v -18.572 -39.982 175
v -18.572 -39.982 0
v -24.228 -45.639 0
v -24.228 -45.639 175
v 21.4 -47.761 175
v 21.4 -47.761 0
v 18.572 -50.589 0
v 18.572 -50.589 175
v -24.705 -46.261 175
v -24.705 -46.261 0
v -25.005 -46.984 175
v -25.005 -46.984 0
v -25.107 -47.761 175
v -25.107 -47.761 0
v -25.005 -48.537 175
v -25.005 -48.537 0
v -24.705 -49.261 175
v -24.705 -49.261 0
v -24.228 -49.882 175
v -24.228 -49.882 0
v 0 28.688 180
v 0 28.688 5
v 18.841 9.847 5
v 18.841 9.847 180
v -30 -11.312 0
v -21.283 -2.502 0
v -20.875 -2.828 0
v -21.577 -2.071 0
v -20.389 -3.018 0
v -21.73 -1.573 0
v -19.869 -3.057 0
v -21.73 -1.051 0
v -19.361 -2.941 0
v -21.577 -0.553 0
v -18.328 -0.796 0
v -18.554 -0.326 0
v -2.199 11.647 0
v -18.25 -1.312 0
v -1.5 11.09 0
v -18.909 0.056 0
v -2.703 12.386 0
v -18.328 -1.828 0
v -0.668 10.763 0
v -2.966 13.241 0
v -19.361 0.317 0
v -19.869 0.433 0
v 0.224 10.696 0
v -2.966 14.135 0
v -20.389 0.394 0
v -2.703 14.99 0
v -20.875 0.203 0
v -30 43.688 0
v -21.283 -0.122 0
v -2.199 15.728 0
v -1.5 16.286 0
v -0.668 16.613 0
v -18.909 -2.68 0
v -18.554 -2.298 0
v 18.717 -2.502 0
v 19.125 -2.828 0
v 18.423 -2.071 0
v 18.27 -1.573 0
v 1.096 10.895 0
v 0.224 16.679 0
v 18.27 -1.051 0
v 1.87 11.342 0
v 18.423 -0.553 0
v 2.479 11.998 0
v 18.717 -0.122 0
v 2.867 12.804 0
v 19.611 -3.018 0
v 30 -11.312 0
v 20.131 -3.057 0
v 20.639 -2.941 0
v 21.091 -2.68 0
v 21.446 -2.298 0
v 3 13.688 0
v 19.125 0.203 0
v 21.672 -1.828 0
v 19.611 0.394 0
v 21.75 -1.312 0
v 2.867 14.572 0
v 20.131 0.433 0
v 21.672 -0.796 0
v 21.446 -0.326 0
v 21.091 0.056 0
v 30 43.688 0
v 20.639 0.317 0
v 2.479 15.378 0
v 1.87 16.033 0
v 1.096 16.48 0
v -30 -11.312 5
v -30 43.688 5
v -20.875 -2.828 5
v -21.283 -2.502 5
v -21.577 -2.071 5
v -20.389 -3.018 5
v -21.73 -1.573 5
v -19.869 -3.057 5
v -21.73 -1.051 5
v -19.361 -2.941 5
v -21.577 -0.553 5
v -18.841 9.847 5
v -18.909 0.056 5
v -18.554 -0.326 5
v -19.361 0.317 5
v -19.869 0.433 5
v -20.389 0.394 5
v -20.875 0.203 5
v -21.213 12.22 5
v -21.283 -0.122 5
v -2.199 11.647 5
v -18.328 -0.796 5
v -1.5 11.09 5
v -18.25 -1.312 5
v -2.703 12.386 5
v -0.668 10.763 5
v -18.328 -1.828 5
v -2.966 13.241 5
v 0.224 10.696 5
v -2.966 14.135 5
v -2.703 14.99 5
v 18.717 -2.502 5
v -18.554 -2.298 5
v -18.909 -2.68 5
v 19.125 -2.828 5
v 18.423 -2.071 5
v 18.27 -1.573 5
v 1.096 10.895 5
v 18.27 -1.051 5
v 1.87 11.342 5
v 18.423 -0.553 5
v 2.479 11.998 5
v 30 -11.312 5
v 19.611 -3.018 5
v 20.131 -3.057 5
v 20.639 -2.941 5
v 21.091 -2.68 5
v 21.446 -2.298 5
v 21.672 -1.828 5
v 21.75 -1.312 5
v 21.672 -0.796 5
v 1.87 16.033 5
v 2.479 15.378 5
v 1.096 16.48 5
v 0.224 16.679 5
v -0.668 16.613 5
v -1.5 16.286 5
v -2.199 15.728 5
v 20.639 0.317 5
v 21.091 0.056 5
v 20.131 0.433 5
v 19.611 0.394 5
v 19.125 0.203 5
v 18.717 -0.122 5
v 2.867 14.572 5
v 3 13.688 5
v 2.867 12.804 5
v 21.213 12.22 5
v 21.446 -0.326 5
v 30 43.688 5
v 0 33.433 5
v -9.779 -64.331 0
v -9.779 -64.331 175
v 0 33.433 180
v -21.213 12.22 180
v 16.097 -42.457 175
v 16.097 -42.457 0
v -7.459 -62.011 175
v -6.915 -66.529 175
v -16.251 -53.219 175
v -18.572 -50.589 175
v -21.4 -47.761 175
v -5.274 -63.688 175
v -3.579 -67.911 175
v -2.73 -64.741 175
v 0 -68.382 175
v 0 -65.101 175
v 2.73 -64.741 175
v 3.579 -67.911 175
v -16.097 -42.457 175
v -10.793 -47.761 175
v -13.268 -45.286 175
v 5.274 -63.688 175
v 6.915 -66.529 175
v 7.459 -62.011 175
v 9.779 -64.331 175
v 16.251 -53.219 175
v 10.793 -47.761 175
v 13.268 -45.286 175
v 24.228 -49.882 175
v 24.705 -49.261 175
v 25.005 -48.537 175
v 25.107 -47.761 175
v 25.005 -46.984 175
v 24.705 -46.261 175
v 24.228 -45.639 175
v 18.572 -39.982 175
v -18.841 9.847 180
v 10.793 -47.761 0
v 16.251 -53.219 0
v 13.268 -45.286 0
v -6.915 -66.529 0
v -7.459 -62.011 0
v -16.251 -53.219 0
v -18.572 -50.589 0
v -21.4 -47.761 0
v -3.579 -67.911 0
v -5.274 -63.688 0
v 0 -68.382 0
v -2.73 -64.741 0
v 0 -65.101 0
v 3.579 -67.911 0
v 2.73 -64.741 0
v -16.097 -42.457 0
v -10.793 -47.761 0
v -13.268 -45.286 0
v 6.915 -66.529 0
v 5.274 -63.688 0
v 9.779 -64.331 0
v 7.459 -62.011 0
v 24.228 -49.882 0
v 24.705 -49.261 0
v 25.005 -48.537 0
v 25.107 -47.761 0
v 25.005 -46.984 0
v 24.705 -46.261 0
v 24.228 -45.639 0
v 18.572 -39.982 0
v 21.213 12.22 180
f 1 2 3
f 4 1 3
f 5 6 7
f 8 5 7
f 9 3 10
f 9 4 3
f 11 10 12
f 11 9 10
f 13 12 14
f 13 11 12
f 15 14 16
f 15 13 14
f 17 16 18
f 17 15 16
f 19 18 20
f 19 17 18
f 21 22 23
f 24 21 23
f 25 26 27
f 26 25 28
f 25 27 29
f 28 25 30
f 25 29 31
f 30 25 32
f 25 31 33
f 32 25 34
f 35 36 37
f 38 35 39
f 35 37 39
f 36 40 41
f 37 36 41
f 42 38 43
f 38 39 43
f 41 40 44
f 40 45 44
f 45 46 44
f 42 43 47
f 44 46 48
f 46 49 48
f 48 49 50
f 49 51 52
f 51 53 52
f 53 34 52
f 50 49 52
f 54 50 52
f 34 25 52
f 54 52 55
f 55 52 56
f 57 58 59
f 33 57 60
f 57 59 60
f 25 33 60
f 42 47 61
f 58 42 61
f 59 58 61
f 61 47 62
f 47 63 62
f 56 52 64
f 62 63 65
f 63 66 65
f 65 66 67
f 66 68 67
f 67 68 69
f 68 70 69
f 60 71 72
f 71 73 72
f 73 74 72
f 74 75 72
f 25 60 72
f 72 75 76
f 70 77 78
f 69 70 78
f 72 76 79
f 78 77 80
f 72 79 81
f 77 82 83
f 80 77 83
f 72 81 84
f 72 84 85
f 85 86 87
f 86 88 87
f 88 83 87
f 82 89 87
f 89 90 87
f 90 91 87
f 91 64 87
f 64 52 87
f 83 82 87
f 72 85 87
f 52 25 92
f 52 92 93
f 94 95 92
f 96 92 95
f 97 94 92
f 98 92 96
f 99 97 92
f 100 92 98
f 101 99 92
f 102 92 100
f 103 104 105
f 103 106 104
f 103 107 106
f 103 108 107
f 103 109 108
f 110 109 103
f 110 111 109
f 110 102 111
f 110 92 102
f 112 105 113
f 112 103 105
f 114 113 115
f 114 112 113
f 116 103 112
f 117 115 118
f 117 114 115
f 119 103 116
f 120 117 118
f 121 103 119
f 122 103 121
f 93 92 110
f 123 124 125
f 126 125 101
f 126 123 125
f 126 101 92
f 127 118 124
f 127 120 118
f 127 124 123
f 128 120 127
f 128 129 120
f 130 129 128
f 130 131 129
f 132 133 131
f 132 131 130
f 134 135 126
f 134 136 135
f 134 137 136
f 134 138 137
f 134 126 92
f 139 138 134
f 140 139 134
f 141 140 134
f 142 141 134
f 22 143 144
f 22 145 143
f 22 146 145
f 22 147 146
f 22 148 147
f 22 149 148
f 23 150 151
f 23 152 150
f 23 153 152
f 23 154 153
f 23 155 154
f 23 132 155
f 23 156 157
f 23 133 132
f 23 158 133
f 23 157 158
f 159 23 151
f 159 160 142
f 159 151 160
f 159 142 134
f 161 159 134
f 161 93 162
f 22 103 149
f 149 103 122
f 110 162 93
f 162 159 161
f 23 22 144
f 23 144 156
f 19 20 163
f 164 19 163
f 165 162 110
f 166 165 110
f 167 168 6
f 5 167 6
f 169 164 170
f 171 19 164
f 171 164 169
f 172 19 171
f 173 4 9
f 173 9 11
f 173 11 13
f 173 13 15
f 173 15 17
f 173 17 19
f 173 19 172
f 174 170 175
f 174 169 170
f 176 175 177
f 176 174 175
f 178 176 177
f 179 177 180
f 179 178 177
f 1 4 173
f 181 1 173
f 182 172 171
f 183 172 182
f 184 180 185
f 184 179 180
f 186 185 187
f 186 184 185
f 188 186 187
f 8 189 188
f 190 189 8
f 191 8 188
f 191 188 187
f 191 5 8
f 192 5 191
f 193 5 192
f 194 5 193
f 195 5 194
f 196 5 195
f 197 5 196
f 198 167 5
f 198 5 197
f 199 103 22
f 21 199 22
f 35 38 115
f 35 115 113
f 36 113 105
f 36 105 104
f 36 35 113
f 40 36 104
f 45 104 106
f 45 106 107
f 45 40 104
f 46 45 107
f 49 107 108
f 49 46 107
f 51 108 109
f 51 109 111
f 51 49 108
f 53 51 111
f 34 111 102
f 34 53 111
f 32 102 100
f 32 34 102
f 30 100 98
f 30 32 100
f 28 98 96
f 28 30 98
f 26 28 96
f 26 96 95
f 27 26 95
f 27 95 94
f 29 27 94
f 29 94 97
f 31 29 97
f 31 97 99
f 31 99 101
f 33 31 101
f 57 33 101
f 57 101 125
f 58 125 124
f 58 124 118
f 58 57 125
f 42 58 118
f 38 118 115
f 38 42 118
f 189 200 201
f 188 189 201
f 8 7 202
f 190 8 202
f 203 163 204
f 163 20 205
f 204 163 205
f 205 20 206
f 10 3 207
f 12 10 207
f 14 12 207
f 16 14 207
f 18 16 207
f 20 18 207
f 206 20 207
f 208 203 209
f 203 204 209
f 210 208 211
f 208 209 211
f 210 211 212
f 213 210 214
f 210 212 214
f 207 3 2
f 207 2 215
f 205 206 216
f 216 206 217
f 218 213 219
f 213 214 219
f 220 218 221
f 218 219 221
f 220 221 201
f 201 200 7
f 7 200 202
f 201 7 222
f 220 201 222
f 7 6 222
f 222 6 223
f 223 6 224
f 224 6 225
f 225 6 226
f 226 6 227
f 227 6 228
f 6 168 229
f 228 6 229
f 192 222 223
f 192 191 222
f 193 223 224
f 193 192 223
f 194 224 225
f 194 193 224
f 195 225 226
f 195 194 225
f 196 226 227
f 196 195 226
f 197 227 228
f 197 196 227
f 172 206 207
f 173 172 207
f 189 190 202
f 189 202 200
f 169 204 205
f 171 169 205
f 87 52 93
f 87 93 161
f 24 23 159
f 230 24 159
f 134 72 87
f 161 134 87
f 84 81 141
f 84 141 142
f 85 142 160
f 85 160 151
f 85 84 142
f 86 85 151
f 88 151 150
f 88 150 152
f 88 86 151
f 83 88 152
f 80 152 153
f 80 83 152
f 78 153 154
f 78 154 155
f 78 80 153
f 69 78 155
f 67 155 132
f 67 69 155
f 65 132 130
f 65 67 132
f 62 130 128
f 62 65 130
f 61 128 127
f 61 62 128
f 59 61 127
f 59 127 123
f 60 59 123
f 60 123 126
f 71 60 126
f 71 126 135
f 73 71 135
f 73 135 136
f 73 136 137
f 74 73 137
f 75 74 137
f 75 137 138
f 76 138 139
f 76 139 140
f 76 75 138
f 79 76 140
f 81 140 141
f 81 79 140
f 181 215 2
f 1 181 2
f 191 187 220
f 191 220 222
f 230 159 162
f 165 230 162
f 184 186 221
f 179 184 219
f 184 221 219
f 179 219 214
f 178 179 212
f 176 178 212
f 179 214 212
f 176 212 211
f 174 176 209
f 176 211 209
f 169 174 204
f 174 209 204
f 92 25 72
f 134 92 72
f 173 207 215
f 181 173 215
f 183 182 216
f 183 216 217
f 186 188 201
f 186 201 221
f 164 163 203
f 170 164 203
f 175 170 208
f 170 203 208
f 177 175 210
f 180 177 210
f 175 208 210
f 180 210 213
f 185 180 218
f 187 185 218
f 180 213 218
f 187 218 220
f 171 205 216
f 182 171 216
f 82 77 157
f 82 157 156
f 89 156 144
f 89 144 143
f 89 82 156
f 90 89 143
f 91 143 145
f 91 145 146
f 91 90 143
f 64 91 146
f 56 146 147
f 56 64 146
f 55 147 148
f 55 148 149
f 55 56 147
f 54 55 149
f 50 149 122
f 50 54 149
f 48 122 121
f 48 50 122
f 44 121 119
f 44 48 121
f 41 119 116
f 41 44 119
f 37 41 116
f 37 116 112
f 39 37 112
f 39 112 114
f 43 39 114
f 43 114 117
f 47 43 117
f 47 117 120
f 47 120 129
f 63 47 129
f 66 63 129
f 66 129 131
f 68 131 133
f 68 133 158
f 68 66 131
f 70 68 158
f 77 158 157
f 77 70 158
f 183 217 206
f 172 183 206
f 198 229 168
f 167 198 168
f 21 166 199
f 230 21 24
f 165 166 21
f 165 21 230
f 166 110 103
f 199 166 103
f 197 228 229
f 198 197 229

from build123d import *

# Parameters (mm, degrees)
F0_W     = 60
F0_H     = 55
F0_R     = 1.75
F0_R_2   = 3
F1_DEPTH = 5
F2_DEPTH = 180
F3_DEPTH = 175
F4_R     = 3


with BuildPart() as f1:
    # F0 (on Top) → F1 (new body)
    with BuildSketch(Plane.XY):
        with Locations((0, 16.187868)):
            Rectangle(F0_W, F0_H)
        with Locations((-20, -1.312132)):
            Circle(F0_R, mode=Mode.SUBTRACT)
        with Locations((0, 13.687868)):
            Circle(F0_R_2, mode=Mode.SUBTRACT)
        with Locations((20, -1.312132)):
            Circle(F0_R, mode=Mode.SUBTRACT)
        Polygon((-18.840602, 9.847266), (-21.213203, 12.219867), (0, 33.43307), (21.213203, 12.219867), (18.840602, 9.847266), (0, 28.687868), align=None, mode=Mode.SUBTRACT)
    extrude(amount=F1_DEPTH)

    # F0 (on Top) → F2 (join)
    with BuildSketch(Plane.XY):
        Polygon((0, 33.43307), (-21.213203, 12.219867), (-18.840602, 9.847266), (0, 28.687868), (18.840602, 9.847266), (21.213203, 12.219867), align=None)
    extrude(amount=F2_DEPTH)


with BuildPart() as f3:
    # F0 (on Top) → F3 (new body)
    with BuildSketch(Plane.XY):
        with BuildLine():
            Line((-16.096699, -42.457327), (-18.571573, -39.982453))
            Line((-18.571573, -39.982453), (-26.349747, -47.760628))
            Line((-26.349747, -47.760628), (-9.779004, -64.331371))
            ThreePointArc((-9.779004, -64.331371), (0, -68.381967), (9.779004, -64.331371))
            Line((9.779004, -64.331371), (26.349747, -47.760628))
            Line((26.349747, -47.760628), (18.571573, -39.982453))
            Line((18.571573, -39.982453), (16.096699, -42.457327))
            Line((16.096699, -42.457327), (21.4, -47.760628))
            Line((21.4, -47.760628), (18.571573, -50.589055))
            Line((18.571573, -50.589055), (13.268272, -45.285754))
            Line((13.268272, -45.285754), (10.793398, -47.760628))
            Line((10.793398, -47.760628), (16.251474, -53.218704))
            Line((16.251474, -53.218704), (7.458906, -62.011273))
            ThreePointArc((7.458906, -62.011273), (0, -65.100852), (-7.458906, -62.011273))
            Line((-7.458906, -62.011273), (-16.251474, -53.218704))
            Line((-16.251474, -53.218704), (-10.793398, -47.760628))
            Line((-10.793398, -47.760628), (-13.268272, -45.285754))
            Line((-13.268272, -45.285754), (-18.571573, -50.589055))
            Line((-18.571573, -50.589055), (-21.4, -47.760628))
            Line((-21.4, -47.760628), (-16.096699, -42.457327))
        make_face()
    extrude(amount=F3_DEPTH)

    # F4
    f4_edges = [f3.edges().sort_by_distance(p)[0] for p in [
        (26.349747, -47.760628, 87.5),
        (-26.349747, -47.760628, 87.5),
    ]]
    fillet(f4_edges, radius=F4_R)


solid = Compound([f1.part, f3.part])
